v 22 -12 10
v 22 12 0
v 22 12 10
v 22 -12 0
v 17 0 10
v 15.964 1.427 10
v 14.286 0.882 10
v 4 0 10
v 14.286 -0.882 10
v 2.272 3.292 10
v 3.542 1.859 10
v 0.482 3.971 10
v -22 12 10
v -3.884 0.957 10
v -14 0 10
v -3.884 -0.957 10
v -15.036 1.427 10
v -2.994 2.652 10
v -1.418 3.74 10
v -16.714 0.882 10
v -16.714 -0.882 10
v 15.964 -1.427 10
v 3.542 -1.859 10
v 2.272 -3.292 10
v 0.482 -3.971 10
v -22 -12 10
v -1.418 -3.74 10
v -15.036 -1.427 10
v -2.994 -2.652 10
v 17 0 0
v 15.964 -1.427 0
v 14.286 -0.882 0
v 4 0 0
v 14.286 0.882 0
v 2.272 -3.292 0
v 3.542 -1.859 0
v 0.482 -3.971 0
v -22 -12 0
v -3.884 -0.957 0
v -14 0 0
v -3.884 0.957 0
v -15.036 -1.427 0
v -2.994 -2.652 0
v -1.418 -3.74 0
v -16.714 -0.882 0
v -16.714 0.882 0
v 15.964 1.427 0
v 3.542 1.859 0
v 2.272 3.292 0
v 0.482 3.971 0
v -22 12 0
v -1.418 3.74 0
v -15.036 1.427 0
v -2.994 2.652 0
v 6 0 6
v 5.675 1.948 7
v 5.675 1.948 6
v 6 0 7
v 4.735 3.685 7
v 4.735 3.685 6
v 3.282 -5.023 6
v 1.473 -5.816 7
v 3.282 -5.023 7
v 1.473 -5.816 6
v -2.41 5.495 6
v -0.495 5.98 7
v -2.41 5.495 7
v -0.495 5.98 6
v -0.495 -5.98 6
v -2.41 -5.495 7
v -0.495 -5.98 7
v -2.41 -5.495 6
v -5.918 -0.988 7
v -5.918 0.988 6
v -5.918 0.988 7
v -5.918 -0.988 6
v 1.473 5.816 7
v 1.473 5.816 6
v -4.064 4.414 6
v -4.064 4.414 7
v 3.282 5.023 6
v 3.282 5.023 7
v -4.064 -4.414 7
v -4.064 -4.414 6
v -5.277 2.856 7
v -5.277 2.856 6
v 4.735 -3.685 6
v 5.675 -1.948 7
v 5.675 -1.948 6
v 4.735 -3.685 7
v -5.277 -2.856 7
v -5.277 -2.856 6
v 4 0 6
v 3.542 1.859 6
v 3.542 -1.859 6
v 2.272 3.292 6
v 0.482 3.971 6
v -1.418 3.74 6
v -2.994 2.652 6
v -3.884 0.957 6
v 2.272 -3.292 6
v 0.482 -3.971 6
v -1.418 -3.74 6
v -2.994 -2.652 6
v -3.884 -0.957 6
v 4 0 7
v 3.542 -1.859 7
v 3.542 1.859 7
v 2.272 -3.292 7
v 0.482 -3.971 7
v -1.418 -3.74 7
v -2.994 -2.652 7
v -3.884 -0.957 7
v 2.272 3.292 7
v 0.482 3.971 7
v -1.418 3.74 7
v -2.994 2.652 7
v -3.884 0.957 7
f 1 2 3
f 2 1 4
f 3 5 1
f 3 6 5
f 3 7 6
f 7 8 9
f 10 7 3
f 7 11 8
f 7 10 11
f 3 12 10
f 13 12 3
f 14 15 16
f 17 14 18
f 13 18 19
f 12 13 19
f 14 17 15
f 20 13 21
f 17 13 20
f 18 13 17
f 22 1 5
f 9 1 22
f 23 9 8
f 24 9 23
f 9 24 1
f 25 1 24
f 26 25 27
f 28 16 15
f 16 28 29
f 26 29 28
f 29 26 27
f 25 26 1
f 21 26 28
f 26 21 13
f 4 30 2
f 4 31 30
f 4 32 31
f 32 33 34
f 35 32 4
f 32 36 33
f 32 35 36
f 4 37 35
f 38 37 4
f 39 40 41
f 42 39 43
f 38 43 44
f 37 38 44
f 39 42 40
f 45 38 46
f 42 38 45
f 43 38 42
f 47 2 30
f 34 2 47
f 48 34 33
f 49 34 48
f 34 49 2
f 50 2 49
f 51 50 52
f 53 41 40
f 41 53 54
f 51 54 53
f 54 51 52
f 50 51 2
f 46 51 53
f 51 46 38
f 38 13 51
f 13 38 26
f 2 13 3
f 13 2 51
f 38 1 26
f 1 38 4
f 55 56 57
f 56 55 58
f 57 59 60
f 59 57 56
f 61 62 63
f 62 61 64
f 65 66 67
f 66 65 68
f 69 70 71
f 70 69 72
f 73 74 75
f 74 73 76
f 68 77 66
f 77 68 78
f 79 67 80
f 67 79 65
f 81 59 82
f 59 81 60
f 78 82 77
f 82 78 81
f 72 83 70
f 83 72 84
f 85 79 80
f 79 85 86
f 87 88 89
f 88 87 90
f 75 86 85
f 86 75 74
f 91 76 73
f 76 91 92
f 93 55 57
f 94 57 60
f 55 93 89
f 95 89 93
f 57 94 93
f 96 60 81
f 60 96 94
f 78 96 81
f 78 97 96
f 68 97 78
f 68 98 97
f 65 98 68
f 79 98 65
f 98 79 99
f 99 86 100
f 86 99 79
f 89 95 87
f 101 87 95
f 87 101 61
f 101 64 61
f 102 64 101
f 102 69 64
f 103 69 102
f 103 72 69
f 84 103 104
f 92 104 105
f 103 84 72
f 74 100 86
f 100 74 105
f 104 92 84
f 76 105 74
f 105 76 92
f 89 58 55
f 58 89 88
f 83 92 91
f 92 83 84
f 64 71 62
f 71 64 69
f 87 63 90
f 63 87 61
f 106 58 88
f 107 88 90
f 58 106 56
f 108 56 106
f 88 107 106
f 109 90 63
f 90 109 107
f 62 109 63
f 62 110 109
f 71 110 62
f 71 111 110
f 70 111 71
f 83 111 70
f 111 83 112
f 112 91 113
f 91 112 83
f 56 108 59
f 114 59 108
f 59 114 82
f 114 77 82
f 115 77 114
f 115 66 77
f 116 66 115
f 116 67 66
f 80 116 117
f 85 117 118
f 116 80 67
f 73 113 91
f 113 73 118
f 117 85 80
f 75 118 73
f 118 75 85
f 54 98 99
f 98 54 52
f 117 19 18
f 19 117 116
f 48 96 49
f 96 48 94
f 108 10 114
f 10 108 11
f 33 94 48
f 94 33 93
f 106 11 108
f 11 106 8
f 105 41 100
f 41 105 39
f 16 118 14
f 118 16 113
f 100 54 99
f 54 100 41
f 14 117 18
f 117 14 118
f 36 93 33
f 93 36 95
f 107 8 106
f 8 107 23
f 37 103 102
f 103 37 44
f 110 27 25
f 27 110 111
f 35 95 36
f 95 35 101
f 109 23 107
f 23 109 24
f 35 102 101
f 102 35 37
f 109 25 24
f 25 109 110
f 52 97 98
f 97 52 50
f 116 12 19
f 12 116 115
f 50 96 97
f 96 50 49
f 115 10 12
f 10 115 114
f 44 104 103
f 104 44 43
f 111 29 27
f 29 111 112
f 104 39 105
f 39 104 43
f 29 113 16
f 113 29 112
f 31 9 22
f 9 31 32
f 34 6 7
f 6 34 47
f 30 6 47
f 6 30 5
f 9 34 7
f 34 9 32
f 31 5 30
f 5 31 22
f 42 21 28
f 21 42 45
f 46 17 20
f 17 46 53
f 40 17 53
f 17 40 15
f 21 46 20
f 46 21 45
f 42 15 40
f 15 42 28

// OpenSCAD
// file: variables_artificial_flower.scad
//----------------------------//
// Flower-Corolla
r_nectory = 5;
l_flower = 50;
thick_flower = 2;
l_additional_corolla_pipe = 20; // including base

fn_corolla_pelets = 14;
fn_petels_surface = 50;

// base
h_base = 10;
w_base = 2*(r_nectory+thick_flower) + 10 ;
l_base_thread = 2*(r_nectory+thick_flower) + 30;
d_thread = 3;
offset_thread = 5;

//----------------------------//
// Tube parameters
r_tube = 4;
r_tube_top = 6;
h_tube_top = 1;
// main file
include <variables_artificial_flower.scad>;

// Tube Holder
difference(){
translate([0, 0, h_base/2])
cube([l_base_thread,w_base,h_base], center=true);
//tube-top
translate([0 , 0, h_base/2 + 1])
cylinder(r=r_tube_top, h=h_tube_top);
////tube-bottom
translate([0, 0, -1])
cylinder(r=r_tube, h=h_base+2);

    //---same as flower-base---//
//Screw +x
translate([l_base_thread/2 - d_thread/2 - offset_thread , 0, -1])
cylinder(r=d_thread/2, h=h_base+2);
//Screw -x
translate([-(l_base_thread/2 - d_thread/2 - offset_thread), 0, -1])
cylinder(r=d_thread/2., h=h_base+2);
}
